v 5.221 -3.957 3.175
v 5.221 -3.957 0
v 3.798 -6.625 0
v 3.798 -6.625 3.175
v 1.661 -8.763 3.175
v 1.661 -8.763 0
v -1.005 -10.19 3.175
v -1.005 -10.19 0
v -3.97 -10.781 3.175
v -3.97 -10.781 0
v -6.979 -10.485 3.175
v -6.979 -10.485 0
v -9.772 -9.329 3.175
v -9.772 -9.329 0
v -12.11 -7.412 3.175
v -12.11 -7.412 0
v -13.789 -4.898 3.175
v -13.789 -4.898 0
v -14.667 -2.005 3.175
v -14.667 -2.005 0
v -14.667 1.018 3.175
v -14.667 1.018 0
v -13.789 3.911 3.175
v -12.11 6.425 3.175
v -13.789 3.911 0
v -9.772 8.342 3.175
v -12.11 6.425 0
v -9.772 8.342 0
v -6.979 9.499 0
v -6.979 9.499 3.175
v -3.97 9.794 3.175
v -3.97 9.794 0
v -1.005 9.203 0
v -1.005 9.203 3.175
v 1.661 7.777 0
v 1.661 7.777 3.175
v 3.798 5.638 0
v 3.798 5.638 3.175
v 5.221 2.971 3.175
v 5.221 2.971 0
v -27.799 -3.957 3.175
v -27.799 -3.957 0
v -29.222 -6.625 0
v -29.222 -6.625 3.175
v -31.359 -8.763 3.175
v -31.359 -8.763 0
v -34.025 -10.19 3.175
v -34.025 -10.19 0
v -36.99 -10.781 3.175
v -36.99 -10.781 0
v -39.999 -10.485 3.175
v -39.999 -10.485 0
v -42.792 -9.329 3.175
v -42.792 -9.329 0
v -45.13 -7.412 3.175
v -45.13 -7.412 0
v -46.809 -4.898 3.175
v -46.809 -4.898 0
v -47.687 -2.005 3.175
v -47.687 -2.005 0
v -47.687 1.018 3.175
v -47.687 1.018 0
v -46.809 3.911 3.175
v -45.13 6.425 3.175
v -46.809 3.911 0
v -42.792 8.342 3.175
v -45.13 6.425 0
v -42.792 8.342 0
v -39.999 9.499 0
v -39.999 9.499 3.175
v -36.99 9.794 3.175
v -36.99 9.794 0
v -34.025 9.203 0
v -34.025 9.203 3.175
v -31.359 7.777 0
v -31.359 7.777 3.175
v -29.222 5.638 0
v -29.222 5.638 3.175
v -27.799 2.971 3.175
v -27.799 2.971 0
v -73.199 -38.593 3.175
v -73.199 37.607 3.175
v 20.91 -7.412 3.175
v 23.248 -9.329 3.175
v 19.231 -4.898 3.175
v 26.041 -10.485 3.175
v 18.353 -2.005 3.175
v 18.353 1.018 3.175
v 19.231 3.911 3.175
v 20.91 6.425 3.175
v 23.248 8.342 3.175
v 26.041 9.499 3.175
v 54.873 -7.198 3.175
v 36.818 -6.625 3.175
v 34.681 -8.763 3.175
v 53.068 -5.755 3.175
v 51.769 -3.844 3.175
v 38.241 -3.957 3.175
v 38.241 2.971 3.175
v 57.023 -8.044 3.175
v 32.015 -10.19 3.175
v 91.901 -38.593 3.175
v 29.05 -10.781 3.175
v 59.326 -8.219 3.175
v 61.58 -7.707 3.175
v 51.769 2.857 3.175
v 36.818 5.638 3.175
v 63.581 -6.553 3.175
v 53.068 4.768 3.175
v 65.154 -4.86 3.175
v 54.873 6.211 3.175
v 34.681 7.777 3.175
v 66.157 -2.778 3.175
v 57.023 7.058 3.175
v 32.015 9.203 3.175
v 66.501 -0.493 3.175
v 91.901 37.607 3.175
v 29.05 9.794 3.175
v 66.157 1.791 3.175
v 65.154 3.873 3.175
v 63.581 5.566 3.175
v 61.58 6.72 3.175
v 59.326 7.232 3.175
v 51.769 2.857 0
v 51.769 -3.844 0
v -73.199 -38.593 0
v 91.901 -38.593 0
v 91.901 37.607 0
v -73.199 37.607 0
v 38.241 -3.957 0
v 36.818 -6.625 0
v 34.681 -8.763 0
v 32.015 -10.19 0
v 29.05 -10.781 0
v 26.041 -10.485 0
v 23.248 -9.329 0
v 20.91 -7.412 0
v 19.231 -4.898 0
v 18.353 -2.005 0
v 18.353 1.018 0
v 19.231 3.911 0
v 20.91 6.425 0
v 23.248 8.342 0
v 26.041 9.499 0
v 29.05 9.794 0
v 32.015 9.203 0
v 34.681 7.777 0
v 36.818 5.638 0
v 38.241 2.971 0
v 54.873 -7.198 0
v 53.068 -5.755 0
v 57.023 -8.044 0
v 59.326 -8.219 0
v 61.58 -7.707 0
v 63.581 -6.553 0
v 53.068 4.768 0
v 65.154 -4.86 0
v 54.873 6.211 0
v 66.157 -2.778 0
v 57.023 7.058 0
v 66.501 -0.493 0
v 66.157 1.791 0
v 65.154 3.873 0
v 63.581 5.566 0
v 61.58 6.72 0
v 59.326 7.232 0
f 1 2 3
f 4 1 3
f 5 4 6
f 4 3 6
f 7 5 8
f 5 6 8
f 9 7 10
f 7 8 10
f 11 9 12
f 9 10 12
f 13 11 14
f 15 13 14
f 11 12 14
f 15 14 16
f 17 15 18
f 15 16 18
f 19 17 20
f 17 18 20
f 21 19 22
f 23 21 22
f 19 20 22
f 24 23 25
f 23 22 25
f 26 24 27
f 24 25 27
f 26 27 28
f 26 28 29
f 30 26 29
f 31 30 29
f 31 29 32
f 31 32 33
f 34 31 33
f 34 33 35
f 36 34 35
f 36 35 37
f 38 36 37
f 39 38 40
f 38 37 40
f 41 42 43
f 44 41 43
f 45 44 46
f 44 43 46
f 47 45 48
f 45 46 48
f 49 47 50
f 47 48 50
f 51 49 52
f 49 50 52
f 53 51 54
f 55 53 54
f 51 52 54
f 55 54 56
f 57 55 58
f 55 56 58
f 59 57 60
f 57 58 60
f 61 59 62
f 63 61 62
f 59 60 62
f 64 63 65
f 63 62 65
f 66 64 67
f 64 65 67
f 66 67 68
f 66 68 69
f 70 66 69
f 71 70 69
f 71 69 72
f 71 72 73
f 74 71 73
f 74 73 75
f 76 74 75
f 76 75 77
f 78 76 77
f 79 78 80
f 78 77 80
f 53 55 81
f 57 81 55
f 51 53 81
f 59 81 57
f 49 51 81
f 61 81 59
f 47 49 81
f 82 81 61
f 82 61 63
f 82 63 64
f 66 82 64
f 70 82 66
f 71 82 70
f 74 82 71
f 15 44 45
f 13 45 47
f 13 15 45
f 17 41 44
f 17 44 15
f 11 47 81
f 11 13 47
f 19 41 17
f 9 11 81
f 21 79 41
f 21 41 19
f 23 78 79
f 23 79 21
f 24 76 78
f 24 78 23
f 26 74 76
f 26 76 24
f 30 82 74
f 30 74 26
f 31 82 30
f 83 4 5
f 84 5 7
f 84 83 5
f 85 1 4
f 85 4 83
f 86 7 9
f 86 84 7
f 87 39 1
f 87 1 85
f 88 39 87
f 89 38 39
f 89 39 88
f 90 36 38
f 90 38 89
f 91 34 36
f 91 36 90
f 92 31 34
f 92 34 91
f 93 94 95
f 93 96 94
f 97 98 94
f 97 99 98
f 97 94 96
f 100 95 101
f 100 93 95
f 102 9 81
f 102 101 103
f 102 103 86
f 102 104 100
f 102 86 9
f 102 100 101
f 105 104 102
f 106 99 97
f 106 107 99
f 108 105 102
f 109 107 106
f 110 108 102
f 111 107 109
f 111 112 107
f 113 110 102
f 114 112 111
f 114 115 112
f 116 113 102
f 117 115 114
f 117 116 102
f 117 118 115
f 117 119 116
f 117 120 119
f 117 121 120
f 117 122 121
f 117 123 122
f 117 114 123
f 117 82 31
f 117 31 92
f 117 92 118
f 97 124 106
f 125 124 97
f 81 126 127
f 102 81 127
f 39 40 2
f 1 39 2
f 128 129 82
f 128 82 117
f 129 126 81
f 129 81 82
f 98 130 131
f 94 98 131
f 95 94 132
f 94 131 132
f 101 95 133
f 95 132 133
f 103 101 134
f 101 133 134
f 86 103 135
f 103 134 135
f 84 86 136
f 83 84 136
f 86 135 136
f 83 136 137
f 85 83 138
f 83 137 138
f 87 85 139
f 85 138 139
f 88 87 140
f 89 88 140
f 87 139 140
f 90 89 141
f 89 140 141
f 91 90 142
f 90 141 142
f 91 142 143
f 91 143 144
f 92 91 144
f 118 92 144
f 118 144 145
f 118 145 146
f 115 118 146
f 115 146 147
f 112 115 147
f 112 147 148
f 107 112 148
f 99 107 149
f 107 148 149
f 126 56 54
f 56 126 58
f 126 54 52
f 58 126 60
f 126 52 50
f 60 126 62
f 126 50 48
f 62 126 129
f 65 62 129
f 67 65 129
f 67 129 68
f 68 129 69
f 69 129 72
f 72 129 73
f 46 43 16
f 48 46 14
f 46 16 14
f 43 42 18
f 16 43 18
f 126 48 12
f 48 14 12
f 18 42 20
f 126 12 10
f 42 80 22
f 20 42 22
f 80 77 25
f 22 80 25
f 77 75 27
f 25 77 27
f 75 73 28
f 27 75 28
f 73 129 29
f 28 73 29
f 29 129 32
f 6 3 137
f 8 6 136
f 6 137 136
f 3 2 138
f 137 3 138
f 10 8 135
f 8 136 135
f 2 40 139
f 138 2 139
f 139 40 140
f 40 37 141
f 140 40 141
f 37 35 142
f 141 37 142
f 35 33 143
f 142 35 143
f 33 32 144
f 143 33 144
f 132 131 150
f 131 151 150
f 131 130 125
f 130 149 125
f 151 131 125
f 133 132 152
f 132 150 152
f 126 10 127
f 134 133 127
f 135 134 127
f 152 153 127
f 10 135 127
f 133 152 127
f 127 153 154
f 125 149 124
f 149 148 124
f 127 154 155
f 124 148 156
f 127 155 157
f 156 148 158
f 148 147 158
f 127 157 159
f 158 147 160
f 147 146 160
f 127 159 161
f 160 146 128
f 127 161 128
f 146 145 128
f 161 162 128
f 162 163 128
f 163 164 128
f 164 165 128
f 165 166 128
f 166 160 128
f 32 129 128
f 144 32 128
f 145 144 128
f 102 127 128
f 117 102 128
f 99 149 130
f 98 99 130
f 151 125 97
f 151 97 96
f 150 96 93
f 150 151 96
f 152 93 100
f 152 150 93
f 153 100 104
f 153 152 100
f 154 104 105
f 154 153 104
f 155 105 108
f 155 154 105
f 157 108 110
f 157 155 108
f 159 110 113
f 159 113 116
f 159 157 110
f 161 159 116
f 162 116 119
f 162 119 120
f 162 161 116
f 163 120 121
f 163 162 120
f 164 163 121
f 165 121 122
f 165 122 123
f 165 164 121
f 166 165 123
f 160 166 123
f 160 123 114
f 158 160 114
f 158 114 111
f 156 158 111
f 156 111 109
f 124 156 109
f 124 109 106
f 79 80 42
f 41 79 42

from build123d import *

# Parameters (mm, degrees)
SKETCH1_W           = 165.1
SKETCH1_H           = 76.2
BOSS_EXTRUDE1_DEPTH = 3.175


with BuildPart() as part:
    # Sketch1 → Boss-Extrude1 (new body)
    with BuildSketch(Plane.XY):
        with Locations((9.351172696, -0.493343457)):
            Rectangle(SKETCH1_W, SKETCH1_H)
        with BuildLine():
            Line((51.769172696, 2.857146657), (51.769172696, -3.84383357))
            ThreePointArc((51.769172696, -3.84383357), (66.501172696, -0.493343457), (51.769172696, 2.857146657))
        make_face(mode=Mode.SUBTRACT)
        with BuildLine():
            Line((-27.798827304, 2.970758158), (-27.798827304, -3.957445072))
            ThreePointArc((-27.798827304, -3.957445072), (-47.798827304, -0.493343457), (-27.798827304, 2.970758158))
        make_face(mode=Mode.SUBTRACT)
        with BuildLine():
            Line((5.221172696, 2.970758158), (5.221172696, -3.957445072))
            ThreePointArc((5.221172696, -3.957445072), (-14.778827304, -0.493343457), (5.221172696, 2.970758158))
        make_face(mode=Mode.SUBTRACT)
        with BuildLine():
            Line((38.241172696, 2.970758158), (38.241172696, -3.957445072))
            ThreePointArc((38.241172696, -3.957445072), (18.241172696, -0.493343457), (38.241172696, 2.970758158))
        make_face(mode=Mode.SUBTRACT)
    extrude(amount=BOSS_EXTRUDE1_DEPTH)


solid = part.part
